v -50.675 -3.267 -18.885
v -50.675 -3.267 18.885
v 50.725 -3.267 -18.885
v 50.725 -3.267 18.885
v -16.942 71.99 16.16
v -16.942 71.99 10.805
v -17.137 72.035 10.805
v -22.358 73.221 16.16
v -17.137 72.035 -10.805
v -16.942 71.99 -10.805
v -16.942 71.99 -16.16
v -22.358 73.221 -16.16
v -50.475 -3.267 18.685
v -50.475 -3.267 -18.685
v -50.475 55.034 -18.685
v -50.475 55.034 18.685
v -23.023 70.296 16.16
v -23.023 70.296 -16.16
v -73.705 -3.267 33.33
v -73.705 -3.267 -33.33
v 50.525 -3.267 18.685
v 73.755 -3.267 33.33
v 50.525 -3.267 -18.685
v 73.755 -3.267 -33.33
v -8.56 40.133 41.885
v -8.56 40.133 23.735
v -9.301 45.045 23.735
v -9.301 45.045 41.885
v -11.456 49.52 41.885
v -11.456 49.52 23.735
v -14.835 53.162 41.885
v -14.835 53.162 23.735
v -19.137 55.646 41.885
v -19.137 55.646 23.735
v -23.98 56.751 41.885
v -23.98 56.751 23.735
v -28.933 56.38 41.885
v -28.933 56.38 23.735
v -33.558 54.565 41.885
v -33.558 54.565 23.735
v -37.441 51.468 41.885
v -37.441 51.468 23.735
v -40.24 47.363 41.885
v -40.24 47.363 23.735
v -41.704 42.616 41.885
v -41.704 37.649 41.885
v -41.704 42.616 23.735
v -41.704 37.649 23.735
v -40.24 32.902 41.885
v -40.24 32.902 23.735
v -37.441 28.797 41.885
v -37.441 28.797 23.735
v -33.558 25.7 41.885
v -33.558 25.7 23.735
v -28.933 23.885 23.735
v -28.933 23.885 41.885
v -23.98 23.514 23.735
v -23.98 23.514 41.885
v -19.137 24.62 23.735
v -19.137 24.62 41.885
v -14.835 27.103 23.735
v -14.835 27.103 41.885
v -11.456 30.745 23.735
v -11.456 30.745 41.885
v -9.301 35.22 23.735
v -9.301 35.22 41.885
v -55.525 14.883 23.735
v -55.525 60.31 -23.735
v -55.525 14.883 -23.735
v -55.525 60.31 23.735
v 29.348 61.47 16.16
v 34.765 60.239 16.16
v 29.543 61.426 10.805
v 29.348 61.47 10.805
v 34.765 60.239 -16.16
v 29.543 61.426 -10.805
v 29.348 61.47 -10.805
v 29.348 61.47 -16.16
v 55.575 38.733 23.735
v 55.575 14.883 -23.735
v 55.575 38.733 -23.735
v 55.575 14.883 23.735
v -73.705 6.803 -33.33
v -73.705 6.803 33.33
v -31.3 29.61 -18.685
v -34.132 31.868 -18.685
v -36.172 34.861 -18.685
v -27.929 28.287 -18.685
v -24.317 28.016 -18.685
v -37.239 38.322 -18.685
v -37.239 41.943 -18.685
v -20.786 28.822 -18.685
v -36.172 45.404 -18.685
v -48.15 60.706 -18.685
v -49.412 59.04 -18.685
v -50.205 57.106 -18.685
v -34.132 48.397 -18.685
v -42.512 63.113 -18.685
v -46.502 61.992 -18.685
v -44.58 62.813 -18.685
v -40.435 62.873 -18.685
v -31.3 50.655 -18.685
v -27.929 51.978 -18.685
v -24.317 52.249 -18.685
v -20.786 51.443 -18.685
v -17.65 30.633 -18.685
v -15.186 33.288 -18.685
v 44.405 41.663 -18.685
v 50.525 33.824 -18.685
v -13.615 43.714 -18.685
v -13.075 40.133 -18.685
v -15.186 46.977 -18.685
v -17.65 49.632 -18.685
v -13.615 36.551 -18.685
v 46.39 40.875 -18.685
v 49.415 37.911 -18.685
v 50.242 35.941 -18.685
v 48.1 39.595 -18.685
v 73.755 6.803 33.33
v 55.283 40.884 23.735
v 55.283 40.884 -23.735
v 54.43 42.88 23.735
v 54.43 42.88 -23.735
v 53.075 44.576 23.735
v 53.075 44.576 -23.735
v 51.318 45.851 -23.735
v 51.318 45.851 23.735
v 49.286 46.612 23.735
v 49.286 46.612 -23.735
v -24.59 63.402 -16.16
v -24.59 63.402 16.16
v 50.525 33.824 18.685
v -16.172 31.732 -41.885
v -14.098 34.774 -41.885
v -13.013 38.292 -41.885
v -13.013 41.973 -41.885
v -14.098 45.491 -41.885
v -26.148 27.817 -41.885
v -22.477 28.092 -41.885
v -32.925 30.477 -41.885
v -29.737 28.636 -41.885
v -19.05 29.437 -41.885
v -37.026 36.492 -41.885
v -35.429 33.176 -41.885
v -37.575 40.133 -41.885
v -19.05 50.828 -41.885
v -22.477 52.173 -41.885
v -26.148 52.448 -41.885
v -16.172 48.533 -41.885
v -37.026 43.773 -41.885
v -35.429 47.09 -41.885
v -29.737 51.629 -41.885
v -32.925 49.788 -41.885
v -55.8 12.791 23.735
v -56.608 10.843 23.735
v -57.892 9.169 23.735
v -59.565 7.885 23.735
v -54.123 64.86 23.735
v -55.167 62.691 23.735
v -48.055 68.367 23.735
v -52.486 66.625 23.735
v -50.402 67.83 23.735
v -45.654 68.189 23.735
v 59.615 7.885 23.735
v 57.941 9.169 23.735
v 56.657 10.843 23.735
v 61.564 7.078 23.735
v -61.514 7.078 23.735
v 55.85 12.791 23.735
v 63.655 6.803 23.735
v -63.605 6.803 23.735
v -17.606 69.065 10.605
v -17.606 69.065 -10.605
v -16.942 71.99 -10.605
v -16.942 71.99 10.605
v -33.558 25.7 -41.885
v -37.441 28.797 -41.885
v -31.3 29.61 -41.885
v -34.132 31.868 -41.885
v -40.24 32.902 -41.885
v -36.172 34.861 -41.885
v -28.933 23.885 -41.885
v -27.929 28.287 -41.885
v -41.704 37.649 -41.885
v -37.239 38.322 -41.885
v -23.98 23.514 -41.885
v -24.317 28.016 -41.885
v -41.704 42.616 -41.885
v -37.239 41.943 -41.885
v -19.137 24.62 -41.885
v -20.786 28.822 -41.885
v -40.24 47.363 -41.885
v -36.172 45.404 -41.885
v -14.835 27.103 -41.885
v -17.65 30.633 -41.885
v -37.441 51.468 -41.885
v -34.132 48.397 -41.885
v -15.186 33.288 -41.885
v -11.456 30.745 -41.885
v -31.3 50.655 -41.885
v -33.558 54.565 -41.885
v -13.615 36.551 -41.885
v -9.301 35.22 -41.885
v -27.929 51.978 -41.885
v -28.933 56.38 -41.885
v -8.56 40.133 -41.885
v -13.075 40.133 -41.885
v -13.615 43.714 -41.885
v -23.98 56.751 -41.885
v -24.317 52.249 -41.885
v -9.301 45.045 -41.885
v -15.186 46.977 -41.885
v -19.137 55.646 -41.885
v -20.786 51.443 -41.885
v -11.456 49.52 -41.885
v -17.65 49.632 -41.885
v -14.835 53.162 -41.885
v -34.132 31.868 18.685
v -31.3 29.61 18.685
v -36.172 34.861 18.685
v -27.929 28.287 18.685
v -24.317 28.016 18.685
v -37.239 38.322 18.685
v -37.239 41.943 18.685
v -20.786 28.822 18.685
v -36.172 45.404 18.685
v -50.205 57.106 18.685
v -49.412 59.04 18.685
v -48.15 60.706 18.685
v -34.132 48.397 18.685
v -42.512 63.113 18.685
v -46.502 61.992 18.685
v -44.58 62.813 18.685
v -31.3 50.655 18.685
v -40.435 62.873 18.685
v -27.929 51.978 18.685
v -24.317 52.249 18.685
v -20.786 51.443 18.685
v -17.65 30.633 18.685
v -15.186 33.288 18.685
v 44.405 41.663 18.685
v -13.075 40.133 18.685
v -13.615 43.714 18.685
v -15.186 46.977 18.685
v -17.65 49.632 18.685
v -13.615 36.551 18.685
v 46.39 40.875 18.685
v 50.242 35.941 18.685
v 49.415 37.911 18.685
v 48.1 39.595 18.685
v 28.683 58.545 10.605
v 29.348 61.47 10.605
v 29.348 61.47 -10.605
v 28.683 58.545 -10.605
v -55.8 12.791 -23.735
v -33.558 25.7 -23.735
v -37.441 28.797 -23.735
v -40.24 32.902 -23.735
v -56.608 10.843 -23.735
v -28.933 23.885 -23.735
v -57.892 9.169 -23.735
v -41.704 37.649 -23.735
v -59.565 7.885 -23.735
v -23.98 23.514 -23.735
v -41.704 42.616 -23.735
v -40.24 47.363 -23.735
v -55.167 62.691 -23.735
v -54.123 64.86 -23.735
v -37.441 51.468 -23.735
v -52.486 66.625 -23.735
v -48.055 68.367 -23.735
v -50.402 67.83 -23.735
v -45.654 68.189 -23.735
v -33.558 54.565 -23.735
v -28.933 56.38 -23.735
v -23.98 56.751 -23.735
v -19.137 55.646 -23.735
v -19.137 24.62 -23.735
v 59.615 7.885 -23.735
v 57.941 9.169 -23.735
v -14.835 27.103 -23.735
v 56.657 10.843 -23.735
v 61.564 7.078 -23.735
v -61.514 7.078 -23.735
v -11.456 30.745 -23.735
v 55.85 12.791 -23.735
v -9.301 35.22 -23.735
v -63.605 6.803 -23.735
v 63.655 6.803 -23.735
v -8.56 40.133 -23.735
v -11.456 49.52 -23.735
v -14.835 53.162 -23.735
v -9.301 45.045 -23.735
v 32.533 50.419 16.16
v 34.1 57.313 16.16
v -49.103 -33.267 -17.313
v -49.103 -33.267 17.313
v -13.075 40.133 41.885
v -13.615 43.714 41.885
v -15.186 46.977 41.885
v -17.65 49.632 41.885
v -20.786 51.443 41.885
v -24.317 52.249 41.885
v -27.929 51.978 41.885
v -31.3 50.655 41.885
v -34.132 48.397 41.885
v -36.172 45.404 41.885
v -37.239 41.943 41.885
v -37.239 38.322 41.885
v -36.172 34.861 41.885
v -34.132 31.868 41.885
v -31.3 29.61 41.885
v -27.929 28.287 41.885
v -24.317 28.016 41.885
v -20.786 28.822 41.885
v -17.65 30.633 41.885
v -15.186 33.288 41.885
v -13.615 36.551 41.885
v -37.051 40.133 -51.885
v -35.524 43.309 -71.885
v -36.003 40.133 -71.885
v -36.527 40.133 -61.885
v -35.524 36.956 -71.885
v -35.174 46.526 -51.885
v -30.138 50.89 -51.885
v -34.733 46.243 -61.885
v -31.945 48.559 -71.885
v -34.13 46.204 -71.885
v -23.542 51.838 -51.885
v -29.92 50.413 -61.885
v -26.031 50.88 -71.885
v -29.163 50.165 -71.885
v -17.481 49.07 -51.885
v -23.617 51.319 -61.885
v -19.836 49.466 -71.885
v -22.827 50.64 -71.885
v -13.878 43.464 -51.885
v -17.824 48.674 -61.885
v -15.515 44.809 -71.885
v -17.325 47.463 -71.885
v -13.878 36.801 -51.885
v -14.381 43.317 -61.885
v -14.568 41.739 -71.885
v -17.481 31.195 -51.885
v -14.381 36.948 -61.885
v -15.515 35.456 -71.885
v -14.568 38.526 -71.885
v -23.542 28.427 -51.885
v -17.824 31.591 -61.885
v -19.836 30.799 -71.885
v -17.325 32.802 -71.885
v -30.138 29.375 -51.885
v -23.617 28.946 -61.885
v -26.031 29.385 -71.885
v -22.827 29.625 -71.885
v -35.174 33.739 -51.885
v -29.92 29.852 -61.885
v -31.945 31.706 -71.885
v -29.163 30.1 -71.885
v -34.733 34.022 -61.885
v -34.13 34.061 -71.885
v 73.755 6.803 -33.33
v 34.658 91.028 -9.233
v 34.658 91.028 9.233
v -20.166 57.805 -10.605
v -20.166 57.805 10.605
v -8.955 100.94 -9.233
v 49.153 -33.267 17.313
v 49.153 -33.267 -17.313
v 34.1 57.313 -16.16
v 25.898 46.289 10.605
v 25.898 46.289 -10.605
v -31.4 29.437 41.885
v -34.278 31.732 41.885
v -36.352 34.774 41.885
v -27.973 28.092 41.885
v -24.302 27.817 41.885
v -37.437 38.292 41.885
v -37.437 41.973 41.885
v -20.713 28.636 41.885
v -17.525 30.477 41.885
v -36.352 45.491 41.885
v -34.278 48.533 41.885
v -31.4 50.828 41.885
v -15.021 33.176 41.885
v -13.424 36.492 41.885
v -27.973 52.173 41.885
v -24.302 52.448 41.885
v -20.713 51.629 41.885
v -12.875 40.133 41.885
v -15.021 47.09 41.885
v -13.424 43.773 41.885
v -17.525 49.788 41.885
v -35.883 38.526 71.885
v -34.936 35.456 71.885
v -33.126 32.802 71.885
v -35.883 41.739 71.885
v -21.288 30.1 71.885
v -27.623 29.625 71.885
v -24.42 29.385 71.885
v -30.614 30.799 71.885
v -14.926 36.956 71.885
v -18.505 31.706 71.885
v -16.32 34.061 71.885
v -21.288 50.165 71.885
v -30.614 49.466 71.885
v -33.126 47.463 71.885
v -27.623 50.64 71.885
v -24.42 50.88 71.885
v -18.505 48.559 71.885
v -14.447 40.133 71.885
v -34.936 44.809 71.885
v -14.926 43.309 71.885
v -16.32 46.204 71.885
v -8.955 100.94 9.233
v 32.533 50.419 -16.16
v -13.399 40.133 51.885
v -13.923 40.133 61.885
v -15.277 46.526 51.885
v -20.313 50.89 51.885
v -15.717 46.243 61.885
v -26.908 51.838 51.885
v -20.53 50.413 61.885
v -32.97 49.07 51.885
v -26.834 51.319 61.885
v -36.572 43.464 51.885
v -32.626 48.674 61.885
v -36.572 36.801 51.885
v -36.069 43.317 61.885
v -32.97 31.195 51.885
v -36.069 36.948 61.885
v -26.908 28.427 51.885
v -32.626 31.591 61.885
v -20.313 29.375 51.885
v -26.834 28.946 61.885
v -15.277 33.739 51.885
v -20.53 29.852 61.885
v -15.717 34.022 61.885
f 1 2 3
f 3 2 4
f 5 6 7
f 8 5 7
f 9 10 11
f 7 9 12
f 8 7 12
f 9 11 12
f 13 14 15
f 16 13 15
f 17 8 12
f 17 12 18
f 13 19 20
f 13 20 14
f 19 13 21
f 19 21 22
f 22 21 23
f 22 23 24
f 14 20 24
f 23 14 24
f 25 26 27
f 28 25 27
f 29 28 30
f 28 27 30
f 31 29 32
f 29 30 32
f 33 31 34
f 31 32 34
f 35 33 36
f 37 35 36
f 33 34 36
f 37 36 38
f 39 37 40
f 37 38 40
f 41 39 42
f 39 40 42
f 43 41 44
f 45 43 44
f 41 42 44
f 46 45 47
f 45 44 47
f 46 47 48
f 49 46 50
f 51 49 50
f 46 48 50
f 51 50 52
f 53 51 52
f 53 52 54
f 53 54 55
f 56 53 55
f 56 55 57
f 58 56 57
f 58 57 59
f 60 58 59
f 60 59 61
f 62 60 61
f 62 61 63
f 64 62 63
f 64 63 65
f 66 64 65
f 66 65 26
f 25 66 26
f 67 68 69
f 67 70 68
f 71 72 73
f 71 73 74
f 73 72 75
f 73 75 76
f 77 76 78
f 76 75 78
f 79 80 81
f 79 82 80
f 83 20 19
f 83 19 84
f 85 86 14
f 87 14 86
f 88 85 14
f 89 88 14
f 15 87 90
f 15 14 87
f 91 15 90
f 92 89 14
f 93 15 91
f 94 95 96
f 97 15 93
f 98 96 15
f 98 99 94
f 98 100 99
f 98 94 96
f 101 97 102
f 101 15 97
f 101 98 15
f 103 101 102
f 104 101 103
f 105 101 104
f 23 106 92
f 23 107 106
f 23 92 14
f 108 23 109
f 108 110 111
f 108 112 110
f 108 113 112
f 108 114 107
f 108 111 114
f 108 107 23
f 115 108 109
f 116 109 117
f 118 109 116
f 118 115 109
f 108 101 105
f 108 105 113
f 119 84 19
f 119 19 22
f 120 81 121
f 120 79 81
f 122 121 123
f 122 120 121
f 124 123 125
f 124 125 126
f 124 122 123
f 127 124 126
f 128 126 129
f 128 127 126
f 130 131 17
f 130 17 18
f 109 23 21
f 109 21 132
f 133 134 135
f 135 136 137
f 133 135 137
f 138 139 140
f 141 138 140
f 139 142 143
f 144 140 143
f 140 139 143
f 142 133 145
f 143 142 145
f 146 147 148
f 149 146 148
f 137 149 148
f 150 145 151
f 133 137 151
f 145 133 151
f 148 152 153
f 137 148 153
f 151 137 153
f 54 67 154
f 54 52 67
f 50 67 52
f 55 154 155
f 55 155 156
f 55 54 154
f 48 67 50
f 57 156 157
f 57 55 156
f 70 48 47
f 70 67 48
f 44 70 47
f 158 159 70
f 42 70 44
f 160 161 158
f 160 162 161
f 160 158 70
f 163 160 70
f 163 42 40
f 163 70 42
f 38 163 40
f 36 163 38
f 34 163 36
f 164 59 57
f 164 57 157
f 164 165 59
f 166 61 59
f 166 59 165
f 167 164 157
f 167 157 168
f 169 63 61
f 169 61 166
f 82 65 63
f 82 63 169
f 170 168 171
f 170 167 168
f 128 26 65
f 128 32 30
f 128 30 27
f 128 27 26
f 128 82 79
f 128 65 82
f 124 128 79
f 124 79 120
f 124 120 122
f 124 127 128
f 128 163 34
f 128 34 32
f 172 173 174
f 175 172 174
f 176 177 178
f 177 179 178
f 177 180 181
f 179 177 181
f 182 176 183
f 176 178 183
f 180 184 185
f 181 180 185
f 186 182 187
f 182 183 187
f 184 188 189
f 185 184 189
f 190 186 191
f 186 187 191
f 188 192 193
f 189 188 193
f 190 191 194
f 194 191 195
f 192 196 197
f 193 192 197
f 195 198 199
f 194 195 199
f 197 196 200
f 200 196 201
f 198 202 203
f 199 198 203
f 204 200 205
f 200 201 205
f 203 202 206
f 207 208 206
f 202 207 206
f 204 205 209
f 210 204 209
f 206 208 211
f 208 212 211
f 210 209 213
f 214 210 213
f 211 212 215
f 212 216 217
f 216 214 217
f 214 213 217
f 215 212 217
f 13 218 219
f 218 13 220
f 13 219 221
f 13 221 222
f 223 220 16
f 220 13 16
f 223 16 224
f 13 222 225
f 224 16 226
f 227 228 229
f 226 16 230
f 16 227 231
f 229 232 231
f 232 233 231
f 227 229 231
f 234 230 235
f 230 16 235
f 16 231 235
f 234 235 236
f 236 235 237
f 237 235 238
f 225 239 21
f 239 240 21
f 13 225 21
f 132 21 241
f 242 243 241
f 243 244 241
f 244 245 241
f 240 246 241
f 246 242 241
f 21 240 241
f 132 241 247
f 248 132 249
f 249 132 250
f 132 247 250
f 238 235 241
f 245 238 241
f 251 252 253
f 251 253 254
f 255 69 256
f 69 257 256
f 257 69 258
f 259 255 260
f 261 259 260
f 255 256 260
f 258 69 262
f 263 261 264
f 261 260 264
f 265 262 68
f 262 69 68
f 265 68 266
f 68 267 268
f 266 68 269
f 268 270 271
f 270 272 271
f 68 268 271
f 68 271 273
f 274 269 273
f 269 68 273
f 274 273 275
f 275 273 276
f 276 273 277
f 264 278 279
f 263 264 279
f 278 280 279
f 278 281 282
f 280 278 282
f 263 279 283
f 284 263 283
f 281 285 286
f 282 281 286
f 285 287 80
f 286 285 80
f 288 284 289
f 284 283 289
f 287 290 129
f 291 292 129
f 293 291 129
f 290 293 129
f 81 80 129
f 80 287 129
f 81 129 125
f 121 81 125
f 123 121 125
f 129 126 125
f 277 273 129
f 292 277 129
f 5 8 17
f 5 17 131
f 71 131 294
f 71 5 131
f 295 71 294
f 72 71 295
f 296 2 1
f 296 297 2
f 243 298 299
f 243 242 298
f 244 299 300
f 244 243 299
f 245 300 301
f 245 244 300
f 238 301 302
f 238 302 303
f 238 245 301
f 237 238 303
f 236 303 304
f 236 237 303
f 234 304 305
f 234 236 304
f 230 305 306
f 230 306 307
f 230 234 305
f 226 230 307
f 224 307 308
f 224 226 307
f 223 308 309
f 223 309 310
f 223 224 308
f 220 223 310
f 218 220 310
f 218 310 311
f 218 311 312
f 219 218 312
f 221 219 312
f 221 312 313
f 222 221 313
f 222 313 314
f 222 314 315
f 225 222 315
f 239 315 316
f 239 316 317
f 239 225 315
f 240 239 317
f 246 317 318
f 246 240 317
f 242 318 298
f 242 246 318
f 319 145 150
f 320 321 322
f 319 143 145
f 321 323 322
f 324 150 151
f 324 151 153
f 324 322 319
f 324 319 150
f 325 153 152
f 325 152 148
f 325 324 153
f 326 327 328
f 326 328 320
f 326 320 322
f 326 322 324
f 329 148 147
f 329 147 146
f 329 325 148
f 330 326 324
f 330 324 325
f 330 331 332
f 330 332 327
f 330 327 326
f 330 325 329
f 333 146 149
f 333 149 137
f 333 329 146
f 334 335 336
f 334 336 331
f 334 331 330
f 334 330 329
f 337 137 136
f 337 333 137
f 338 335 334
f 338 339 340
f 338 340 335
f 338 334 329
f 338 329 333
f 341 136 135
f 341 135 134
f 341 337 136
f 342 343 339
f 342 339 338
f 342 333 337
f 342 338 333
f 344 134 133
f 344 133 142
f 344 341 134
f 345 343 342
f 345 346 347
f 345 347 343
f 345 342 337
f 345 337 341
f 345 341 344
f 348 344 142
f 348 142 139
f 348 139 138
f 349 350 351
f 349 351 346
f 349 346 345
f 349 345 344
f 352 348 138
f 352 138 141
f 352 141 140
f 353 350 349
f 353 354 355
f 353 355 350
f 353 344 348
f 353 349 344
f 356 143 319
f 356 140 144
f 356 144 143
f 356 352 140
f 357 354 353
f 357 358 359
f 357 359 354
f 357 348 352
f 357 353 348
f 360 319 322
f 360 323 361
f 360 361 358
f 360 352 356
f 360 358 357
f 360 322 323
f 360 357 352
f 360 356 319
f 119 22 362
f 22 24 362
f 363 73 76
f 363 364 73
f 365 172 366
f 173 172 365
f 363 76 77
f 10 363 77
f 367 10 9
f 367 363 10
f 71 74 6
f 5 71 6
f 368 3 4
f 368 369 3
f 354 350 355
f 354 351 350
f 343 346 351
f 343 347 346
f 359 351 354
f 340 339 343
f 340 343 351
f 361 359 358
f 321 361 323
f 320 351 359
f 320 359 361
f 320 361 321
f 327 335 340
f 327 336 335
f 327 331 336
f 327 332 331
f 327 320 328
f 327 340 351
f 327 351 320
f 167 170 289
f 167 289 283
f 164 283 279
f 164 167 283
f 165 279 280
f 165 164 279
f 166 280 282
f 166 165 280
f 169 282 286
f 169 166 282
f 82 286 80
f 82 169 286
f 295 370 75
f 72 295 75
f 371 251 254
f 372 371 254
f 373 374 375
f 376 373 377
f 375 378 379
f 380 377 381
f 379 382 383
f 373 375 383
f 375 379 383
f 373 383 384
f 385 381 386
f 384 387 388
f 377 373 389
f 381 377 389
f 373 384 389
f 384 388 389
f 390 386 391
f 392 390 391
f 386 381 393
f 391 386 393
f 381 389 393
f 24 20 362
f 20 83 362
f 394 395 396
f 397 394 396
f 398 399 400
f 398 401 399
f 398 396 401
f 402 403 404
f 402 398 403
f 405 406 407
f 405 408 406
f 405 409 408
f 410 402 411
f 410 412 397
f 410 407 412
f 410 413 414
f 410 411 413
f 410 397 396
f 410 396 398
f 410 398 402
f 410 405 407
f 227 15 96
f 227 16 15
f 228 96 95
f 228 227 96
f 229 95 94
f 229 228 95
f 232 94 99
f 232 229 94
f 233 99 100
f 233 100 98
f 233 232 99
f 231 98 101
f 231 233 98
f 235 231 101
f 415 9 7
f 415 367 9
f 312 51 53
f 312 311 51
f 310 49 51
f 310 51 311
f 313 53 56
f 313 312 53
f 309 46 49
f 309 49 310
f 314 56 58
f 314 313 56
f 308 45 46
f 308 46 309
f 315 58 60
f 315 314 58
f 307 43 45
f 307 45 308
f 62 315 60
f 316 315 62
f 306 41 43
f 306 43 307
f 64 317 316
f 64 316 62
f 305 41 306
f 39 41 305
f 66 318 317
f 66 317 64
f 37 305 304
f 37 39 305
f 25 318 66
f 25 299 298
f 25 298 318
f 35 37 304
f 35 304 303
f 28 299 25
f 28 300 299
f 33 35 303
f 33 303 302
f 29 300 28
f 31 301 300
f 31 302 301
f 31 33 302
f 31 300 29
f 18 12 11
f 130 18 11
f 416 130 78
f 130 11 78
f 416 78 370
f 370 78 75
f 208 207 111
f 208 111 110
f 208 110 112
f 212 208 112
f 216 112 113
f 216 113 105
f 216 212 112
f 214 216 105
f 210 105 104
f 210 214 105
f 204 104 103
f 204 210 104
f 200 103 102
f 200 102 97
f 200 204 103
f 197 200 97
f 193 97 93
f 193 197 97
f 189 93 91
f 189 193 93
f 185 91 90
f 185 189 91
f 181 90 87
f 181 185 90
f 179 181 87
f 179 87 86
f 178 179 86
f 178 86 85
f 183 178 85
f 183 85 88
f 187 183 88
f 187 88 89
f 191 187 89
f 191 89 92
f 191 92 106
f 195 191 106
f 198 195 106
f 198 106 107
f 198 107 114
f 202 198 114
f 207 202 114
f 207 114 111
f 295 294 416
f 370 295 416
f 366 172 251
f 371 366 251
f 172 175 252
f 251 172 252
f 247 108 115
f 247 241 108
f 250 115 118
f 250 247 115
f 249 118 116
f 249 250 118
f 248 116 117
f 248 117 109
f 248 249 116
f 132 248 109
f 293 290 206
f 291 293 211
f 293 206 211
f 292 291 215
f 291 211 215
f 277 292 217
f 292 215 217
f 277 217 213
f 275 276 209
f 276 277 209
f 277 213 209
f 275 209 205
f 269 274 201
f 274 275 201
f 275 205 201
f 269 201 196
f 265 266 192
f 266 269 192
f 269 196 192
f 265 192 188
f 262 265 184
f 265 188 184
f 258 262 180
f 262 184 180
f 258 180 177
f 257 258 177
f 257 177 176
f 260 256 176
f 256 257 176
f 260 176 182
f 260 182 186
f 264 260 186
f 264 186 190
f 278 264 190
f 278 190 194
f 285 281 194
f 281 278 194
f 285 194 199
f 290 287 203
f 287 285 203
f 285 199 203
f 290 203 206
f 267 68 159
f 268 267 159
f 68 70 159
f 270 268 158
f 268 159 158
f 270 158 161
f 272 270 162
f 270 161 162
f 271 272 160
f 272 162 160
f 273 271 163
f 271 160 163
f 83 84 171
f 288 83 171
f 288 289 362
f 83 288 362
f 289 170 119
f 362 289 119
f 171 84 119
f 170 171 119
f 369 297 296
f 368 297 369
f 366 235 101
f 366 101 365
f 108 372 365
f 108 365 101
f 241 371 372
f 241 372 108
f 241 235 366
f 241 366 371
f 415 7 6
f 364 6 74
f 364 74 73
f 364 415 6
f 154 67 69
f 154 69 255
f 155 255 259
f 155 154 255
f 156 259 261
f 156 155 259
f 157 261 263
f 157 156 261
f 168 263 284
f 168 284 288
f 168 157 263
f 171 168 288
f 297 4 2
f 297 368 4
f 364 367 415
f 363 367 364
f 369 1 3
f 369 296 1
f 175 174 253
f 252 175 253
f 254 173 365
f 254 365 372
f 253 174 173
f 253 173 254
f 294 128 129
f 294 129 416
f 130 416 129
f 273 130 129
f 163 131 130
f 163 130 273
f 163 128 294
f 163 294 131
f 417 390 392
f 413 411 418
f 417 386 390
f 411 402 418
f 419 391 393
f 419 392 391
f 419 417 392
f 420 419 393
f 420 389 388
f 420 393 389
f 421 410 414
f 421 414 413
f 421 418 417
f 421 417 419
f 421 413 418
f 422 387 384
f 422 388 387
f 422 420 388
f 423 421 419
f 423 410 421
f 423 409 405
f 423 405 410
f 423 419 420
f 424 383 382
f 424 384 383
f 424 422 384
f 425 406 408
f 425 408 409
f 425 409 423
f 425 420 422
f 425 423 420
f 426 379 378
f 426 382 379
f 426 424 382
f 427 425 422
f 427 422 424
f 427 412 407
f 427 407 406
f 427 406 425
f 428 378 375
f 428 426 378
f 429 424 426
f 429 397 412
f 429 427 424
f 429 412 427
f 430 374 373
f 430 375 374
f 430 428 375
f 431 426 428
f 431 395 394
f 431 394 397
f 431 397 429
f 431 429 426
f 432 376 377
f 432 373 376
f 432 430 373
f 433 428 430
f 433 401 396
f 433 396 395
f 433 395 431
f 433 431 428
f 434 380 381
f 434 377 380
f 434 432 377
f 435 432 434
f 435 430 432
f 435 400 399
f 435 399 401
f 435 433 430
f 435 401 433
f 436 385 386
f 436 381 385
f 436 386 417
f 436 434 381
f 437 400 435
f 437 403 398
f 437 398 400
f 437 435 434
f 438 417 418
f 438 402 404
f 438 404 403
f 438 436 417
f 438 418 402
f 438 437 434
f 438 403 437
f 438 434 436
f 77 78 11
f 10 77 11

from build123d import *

# Parameters (mm, degrees)
BOSS_EXTRUDE1_DEPTH      = 23.5
BOSS_EXTRUDE2_DEPTH      = 15
BOSS_EXTRUDE2_DEPTH_BACK = 62
SKETCH2_R                = 16.5
CUT_EXTRUDE1_DEPTH       = 18.5
SKETCH4_R                = 15
CUT_EXTRUDE2_DEPTH       = 128.114121953
FILLET1_R                = 8
SKETCH5_W                = 58
SKETCH5_H                = 32
BOSS_EXTRUDE3_DEPTH      = 7
CUT_EXTRUDE4_REACH       = 115.269
SKETCH6_W                = 47
SKETCH6_H                = 21
SKETCH7_W                = 146
SKETCH7_H                = 66
SKETCH7_W_2              = 100
SKETCH7_H_2              = 37
BOSS_EXTRUDE5_DEPTH      = 7
SCALE1_SCALE             = 1.01
MOVE_START               = -33.33
MOVE_FACE1_OUTLINE_W     = 147.46
MOVE_FACE1_OUTLINE_H     = 3
MOVE_FACE1_OUTLINE_R     = 15.15
MOVE_FACE1_OUTLINE_R_2   = 12.15
MOVE_FACE1_DEPTH         = 14.645
MOVE_START_2             = 18.685
MOVE_FACE1_2_OUTLINE_W   = 147.46
MOVE_FACE1_2_OUTLINE_H   = 3
MOVE_FACE1_2_OUTLINE_R   = 15.15
MOVE_FACE1_2_OUTLINE_R_2 = 12.15
MOVE_FACE1_2_DEPTH       = 14.645
MOVE_START_3             = -16.16
MOVE_FACE1_3_OUTLINE_W   = 23.23
MOVE_FACE1_3_OUTLINE_H   = 3
MOVE_FACE1_3_DEPTH       = 32.32
MOVE_START_4             = -41.885
MOVE_FACE1_4_OUTLINE_R   = 16.665
MOVE_FACE1_4_OUTLINE_R_2 = 12.15
MOVE_FACE1_4_DEPTH       = 8.555
MOVE_START_5             = 33.33
MOVE_FACE1_5_OUTLINE_R   = 16.665
MOVE_FACE1_5_OUTLINE_R_2 = 12.15
MOVE_FACE1_5_DEPTH       = 8.555
MOVE_FACE1_6_DEPTH       = 5.555
MOVE_START_6             = 10.605
MOVE_FACE1_7_DEPTH       = 5.555
MOVE_START_7             = -18.685
MOVE_FACE1_8_OUTLINE_W   = 23.23
MOVE_FACE1_8_OUTLINE_H   = 3
MOVE_FACE1_8_DEPTH       = 37.37
SKETCH8_R                = 12.35
BOSS_EXTRUDE6_DEPTH      = 30
BOSS_EXTRUDE6_TAPER      = 3
SKETCH9_R                = 12.35
BOSS_EXTRUDE7_DEPTH      = 30
BOSS_EXTRUDE7_TAPER      = 3
SKETCH12_W               = 47.87
SKETCH12_H               = 21.61
BOSS_EXTRUDE10_DEPTH     = 30
BOSS_EXTRUDE10_TAPER     = 3
SKETCH11_W               = 101.4
SKETCH11_H               = 37.77
BOSS_EXTRUDE9_DEPTH      = 30
BOSS_EXTRUDE9_TAPER      = 3


# Read off the part's stored shape, not the designer's step: Move Face1
with BuildPart() as part:
    # Sketch1 → Boss-Extrude1 (new, symmetric)
    with BuildSketch(Plane.XY):
        with BuildLine():
            Line((-73, 0), (73, 0))
            Line((73, 0), (73, 7))
            Line((73, 7), (63, 7))
            ThreePointArc((63, 7), (57.343145751, 9.343145751), (55, 15))
            Line((55, 15), (55, 45))
            Line((55, 45), (-55, 70))
            Line((-55, 70), (-55, 15))
            ThreePointArc((-55, 15), (-57.343145751, 9.343145751), (-63, 7))
            Line((-63, 7), (-73, 7))
            Line((-73, 7), (-73, 0))
        make_face()
    extrude(amount=BOSS_EXTRUDE1_DEPTH, both=True)

    # Sketch2 → Boss-Extrude2 (add, two sides: drawn at the far end of the back side and taken through both)
    with BuildSketch(Plane.XY.offset(23.5).offset(-BOSS_EXTRUDE2_DEPTH_BACK)):
        with Locations((-25, 40)):
            Circle(SKETCH2_R)
    extrude(amount=BOSS_EXTRUDE2_DEPTH + BOSS_EXTRUDE2_DEPTH_BACK)

    # Sketch3 → Cut-Extrude1 (cut, symmetric)
    with BuildSketch(Plane.XY):
        with BuildLine():
            Line((-50, 0), (-50, 54.753788749))
            ThreePointArc((-50, 54.753788749), (-46.923297675, 61.059432253), (-40.059715, 62.51492875))
            Line((-40.059715, 62.51492875), (43.940285, 41.51492875))
            ThreePointArc((43.940285, 41.51492875), (48.305643504, 38.677086424), (50, 33.753788749))
            Line((50, 33.753788749), (50, 0))
            Line((50, 0), (-50, 0))
        make_face()
    extrude(amount=CUT_EXTRUDE1_DEPTH, both=True, mode=Mode.SUBTRACT)

    # Sketch4 → Cut-Extrude2 (cut, through all)
    with BuildSketch(Plane.XY.offset(38.5)):
        with Locations((-25, 40)):
            Circle(SKETCH4_R)
    extrude(amount=-CUT_EXTRUDE2_DEPTH, mode=Mode.SUBTRACT)

    # Fillet1
    fillet1_edges = [part.edges().sort_by_distance(p)[0] for p in [
        (-55, 70, 0),
        (55, 45, 0),
    ]]
    fillet(fillet1_edges, radius=FILLET1_R)

    # Sketch5 → Boss-Extrude3 (add)
    with BuildSketch(Plane(origin=(12.42632613, 54.675834971, 0), x_dir=(0.9751328557914598, -0.2216211035889682, 0), z_dir=(0.22162110358896822, 0.9751328557914599, 0))):
        with Locations((-8.736046198, 0)):
            Rectangle(SKETCH5_W, SKETCH5_H)
    extrude(amount=BOSS_EXTRUDE3_DEPTH)

    # Cut-Extrude4: up to this plane
    cut_extrude4_end = Plane(origin=(-40.059715, 62.51492875, -18.5), z_dir=(0.24253562503633289, 0.970142500145332, 0))
    # Sketch6 → Cut-Extrude4 (cut, up to the surface)
    with BuildSketch(Plane(origin=(13.977673855, 61.501764961, 0), x_dir=(0.9751328557914598, -0.2216211035889683, 0), z_dir=(0.2216211035889683, 0.9751328557914598, 0)), mode=Mode.PRIVATE) as cut_extrude4_sk1:
        with Locations((-8.736046198, 0)):
            Rectangle(SKETCH6_W, SKETCH6_H)
    cut_extrude4_tool1 = split(extrude(cut_extrude4_sk1.sketch, amount=-CUT_EXTRUDE4_REACH, mode=Mode.PRIVATE), bisect_by=cut_extrude4_end, keep=Keep.BOTH, mode=Mode.PRIVATE)
    add(cut_extrude4_tool1.solids().sort_by_distance((5.458868, 63.437857, 0))[0], mode=Mode.SUBTRACT)

    # Sketch7 → Boss-Extrude5 (add)
    with BuildSketch(Plane.XZ):
        Rectangle(SKETCH7_W, SKETCH7_H)
        Rectangle(SKETCH7_W_2, SKETCH7_H_2, mode=Mode.SUBTRACT)
    extrude(amount=-BOSS_EXTRUDE5_DEPTH)


with BuildPart() as part_1:
    # Scale1: scaled about (-2.483179367, 26.747657508, 0)
    add(part.part.scale(SCALE1_SCALE).moved(Location((0.024831794, -0.267476575, 0))))

    # Move Face1 outline → Move Face1 (add)
    # profile 1 of 2: a face of its own
    with BuildSketch(Plane.XY.offset(MOVE_START)):
        with Locations((0.024831794, -1.767476575)):
            Rectangle(MOVE_FACE1_OUTLINE_W, MOVE_FACE1_OUTLINE_H)
    # profile 2 of 2: a face of its own
    with BuildSketch(Plane.XY.offset(MOVE_START)):
        with Locations((-25.225168206, 40.132523425)):
            Circle(MOVE_FACE1_OUTLINE_R)
        with Locations((-25.225168206, 40.132523425)):
            Circle(MOVE_FACE1_OUTLINE_R_2, mode=Mode.SUBTRACT)
    extrude(amount=MOVE_FACE1_DEPTH)

    # Move Face1 2 outline → Move Face1 2 (add)
    # profile 1 of 2: a face of its own
    with BuildSketch(Plane.XY.offset(MOVE_START_2)):
        with Locations((0.024831794, -1.767476575)):
            Rectangle(MOVE_FACE1_2_OUTLINE_W, MOVE_FACE1_2_OUTLINE_H)
    # profile 2 of 2: a face of its own
    with BuildSketch(Plane.XY.offset(MOVE_START_2)):
        with Locations((-25.225168206, 40.132523425)):
            Circle(MOVE_FACE1_2_OUTLINE_R)
        with Locations((-25.225168206, 40.132523425)):
            Circle(MOVE_FACE1_2_OUTLINE_R_2, mode=Mode.SUBTRACT)
    extrude(amount=MOVE_FACE1_2_DEPTH)

    # Move Face1 3 outline → Move Face1 3 (add)
    with BuildSketch(Plane.XY.offset(MOVE_START_3)):
        with Locations((62.139831794, -1.767476575)):
            Rectangle(MOVE_FACE1_3_OUTLINE_W, MOVE_FACE1_3_OUTLINE_H)
        with Locations((-62.090168206, -1.767476575)):
            Rectangle(MOVE_FACE1_3_OUTLINE_W, MOVE_FACE1_3_OUTLINE_H)
        Polygon((34.099929999, 57.313477033), (34.76479331, 60.2388756), (29.347930296, 61.46998083), (28.683066985, 58.544582263), align=None)
        Polygon((-17.606489679, 69.064936051), (-16.941626368, 71.990334618), (-22.358489382, 73.221439848), (-23.023352693, 70.296041281), align=None)
    extrude(amount=MOVE_FACE1_3_DEPTH)

    # Move Face1 4 outline → Move Face1 4 (add)
    with BuildSketch(Plane.XY.offset(MOVE_START_4)):
        with Locations((-25.225168206, 40.132523425)):
            Circle(MOVE_FACE1_4_OUTLINE_R)
        with Locations((-25.225168206, 40.132523425)):
            Circle(MOVE_FACE1_4_OUTLINE_R_2, mode=Mode.SUBTRACT)
    extrude(amount=MOVE_FACE1_4_DEPTH)

    # Move Face1 5 outline → Move Face1 5 (add)
    with BuildSketch(Plane.XY.offset(MOVE_START_5)):
        with Locations((-25.225168206, 40.132523425)):
            Circle(MOVE_FACE1_5_OUTLINE_R)
        with Locations((-25.225168206, 40.132523425)):
            Circle(MOVE_FACE1_5_OUTLINE_R_2, mode=Mode.SUBTRACT)
    extrude(amount=MOVE_FACE1_5_DEPTH)

    # Move Face1 6 outline → Move Face1 6 (add)
    with BuildSketch(Plane.XY.offset(MOVE_START_3)):
        Polygon((28.683066985, 58.544582263), (29.347930296, 61.469980831), (-16.941626368, 71.990334618), (-17.606489679, 69.064936051), align=None)
    extrude(amount=MOVE_FACE1_6_DEPTH)

    # Move Face1 7 outline → Move Face1 7 (add)
    with BuildSketch(Plane.XY.offset(MOVE_START_6)):
        Polygon((28.683066985, 58.544582263), (29.347930296, 61.469980831), (-16.941626368, 71.990334618), (-17.606489679, 69.064936051), align=None)
    extrude(amount=MOVE_FACE1_7_DEPTH)

    # Move Face1 8 outline → Move Face1 8 (add)
    with BuildSketch(Plane.XY.offset(MOVE_START_7)):
        with Locations((62.139831794, -1.767476575)):
            Rectangle(MOVE_FACE1_8_OUTLINE_W, MOVE_FACE1_8_OUTLINE_H)
        with Locations((-62.090168206, -1.767476575)):
            Rectangle(MOVE_FACE1_8_OUTLINE_W, MOVE_FACE1_8_OUTLINE_H)
    extrude(amount=MOVE_FACE1_8_DEPTH)

    # Sketch12 → Boss-Extrude10 (add)
    with BuildSketch(Plane(origin=(14.725729172, 64.793208359, 0), x_dir=(0.9751328557914598, -0.2216211035889683, 0), z_dir=(0.2216211035889683, 0.9751328557914598, 0))):
        with Locations((-8.739913908, 0)):
            Rectangle(SKETCH12_W, SKETCH12_H)
    extrude(amount=BOSS_EXTRUDE10_DEPTH, taper=BOSS_EXTRUDE10_TAPER)


with BuildPart() as body_2:
    # Sketch8 → Boss-Extrude6 (new body)
    with BuildSketch(Plane.XY.offset(41.885)):
        with Locations((-25.225168206, 40.132523425)):
            Circle(SKETCH8_R)
    extrude(amount=BOSS_EXTRUDE6_DEPTH, taper=BOSS_EXTRUDE6_TAPER)


with BuildPart() as body_3:
    # Sketch9 → Boss-Extrude7 (new body)
    with BuildSketch(Plane(origin=(0, 0, -41.885), x_dir=(-1, 0, 0), z_dir=(0, 0, -1))):
        with Locations((25.225168206, 40.132523425)):
            Circle(SKETCH9_R)
    extrude(amount=BOSS_EXTRUDE7_DEPTH, taper=BOSS_EXTRUDE7_TAPER)


with BuildPart() as body_4:
    # Sketch11 → Boss-Extrude9 (new body)
    with BuildSketch(Plane.XZ.offset(3.267476575)):
        with Locations((0.024831794, 0)):
            Rectangle(SKETCH11_W, SKETCH11_H)
    extrude(amount=BOSS_EXTRUDE9_DEPTH, taper=BOSS_EXTRUDE9_TAPER)


solid = Compound([part_1.part, body_2.part, body_3.part, body_4.part])
